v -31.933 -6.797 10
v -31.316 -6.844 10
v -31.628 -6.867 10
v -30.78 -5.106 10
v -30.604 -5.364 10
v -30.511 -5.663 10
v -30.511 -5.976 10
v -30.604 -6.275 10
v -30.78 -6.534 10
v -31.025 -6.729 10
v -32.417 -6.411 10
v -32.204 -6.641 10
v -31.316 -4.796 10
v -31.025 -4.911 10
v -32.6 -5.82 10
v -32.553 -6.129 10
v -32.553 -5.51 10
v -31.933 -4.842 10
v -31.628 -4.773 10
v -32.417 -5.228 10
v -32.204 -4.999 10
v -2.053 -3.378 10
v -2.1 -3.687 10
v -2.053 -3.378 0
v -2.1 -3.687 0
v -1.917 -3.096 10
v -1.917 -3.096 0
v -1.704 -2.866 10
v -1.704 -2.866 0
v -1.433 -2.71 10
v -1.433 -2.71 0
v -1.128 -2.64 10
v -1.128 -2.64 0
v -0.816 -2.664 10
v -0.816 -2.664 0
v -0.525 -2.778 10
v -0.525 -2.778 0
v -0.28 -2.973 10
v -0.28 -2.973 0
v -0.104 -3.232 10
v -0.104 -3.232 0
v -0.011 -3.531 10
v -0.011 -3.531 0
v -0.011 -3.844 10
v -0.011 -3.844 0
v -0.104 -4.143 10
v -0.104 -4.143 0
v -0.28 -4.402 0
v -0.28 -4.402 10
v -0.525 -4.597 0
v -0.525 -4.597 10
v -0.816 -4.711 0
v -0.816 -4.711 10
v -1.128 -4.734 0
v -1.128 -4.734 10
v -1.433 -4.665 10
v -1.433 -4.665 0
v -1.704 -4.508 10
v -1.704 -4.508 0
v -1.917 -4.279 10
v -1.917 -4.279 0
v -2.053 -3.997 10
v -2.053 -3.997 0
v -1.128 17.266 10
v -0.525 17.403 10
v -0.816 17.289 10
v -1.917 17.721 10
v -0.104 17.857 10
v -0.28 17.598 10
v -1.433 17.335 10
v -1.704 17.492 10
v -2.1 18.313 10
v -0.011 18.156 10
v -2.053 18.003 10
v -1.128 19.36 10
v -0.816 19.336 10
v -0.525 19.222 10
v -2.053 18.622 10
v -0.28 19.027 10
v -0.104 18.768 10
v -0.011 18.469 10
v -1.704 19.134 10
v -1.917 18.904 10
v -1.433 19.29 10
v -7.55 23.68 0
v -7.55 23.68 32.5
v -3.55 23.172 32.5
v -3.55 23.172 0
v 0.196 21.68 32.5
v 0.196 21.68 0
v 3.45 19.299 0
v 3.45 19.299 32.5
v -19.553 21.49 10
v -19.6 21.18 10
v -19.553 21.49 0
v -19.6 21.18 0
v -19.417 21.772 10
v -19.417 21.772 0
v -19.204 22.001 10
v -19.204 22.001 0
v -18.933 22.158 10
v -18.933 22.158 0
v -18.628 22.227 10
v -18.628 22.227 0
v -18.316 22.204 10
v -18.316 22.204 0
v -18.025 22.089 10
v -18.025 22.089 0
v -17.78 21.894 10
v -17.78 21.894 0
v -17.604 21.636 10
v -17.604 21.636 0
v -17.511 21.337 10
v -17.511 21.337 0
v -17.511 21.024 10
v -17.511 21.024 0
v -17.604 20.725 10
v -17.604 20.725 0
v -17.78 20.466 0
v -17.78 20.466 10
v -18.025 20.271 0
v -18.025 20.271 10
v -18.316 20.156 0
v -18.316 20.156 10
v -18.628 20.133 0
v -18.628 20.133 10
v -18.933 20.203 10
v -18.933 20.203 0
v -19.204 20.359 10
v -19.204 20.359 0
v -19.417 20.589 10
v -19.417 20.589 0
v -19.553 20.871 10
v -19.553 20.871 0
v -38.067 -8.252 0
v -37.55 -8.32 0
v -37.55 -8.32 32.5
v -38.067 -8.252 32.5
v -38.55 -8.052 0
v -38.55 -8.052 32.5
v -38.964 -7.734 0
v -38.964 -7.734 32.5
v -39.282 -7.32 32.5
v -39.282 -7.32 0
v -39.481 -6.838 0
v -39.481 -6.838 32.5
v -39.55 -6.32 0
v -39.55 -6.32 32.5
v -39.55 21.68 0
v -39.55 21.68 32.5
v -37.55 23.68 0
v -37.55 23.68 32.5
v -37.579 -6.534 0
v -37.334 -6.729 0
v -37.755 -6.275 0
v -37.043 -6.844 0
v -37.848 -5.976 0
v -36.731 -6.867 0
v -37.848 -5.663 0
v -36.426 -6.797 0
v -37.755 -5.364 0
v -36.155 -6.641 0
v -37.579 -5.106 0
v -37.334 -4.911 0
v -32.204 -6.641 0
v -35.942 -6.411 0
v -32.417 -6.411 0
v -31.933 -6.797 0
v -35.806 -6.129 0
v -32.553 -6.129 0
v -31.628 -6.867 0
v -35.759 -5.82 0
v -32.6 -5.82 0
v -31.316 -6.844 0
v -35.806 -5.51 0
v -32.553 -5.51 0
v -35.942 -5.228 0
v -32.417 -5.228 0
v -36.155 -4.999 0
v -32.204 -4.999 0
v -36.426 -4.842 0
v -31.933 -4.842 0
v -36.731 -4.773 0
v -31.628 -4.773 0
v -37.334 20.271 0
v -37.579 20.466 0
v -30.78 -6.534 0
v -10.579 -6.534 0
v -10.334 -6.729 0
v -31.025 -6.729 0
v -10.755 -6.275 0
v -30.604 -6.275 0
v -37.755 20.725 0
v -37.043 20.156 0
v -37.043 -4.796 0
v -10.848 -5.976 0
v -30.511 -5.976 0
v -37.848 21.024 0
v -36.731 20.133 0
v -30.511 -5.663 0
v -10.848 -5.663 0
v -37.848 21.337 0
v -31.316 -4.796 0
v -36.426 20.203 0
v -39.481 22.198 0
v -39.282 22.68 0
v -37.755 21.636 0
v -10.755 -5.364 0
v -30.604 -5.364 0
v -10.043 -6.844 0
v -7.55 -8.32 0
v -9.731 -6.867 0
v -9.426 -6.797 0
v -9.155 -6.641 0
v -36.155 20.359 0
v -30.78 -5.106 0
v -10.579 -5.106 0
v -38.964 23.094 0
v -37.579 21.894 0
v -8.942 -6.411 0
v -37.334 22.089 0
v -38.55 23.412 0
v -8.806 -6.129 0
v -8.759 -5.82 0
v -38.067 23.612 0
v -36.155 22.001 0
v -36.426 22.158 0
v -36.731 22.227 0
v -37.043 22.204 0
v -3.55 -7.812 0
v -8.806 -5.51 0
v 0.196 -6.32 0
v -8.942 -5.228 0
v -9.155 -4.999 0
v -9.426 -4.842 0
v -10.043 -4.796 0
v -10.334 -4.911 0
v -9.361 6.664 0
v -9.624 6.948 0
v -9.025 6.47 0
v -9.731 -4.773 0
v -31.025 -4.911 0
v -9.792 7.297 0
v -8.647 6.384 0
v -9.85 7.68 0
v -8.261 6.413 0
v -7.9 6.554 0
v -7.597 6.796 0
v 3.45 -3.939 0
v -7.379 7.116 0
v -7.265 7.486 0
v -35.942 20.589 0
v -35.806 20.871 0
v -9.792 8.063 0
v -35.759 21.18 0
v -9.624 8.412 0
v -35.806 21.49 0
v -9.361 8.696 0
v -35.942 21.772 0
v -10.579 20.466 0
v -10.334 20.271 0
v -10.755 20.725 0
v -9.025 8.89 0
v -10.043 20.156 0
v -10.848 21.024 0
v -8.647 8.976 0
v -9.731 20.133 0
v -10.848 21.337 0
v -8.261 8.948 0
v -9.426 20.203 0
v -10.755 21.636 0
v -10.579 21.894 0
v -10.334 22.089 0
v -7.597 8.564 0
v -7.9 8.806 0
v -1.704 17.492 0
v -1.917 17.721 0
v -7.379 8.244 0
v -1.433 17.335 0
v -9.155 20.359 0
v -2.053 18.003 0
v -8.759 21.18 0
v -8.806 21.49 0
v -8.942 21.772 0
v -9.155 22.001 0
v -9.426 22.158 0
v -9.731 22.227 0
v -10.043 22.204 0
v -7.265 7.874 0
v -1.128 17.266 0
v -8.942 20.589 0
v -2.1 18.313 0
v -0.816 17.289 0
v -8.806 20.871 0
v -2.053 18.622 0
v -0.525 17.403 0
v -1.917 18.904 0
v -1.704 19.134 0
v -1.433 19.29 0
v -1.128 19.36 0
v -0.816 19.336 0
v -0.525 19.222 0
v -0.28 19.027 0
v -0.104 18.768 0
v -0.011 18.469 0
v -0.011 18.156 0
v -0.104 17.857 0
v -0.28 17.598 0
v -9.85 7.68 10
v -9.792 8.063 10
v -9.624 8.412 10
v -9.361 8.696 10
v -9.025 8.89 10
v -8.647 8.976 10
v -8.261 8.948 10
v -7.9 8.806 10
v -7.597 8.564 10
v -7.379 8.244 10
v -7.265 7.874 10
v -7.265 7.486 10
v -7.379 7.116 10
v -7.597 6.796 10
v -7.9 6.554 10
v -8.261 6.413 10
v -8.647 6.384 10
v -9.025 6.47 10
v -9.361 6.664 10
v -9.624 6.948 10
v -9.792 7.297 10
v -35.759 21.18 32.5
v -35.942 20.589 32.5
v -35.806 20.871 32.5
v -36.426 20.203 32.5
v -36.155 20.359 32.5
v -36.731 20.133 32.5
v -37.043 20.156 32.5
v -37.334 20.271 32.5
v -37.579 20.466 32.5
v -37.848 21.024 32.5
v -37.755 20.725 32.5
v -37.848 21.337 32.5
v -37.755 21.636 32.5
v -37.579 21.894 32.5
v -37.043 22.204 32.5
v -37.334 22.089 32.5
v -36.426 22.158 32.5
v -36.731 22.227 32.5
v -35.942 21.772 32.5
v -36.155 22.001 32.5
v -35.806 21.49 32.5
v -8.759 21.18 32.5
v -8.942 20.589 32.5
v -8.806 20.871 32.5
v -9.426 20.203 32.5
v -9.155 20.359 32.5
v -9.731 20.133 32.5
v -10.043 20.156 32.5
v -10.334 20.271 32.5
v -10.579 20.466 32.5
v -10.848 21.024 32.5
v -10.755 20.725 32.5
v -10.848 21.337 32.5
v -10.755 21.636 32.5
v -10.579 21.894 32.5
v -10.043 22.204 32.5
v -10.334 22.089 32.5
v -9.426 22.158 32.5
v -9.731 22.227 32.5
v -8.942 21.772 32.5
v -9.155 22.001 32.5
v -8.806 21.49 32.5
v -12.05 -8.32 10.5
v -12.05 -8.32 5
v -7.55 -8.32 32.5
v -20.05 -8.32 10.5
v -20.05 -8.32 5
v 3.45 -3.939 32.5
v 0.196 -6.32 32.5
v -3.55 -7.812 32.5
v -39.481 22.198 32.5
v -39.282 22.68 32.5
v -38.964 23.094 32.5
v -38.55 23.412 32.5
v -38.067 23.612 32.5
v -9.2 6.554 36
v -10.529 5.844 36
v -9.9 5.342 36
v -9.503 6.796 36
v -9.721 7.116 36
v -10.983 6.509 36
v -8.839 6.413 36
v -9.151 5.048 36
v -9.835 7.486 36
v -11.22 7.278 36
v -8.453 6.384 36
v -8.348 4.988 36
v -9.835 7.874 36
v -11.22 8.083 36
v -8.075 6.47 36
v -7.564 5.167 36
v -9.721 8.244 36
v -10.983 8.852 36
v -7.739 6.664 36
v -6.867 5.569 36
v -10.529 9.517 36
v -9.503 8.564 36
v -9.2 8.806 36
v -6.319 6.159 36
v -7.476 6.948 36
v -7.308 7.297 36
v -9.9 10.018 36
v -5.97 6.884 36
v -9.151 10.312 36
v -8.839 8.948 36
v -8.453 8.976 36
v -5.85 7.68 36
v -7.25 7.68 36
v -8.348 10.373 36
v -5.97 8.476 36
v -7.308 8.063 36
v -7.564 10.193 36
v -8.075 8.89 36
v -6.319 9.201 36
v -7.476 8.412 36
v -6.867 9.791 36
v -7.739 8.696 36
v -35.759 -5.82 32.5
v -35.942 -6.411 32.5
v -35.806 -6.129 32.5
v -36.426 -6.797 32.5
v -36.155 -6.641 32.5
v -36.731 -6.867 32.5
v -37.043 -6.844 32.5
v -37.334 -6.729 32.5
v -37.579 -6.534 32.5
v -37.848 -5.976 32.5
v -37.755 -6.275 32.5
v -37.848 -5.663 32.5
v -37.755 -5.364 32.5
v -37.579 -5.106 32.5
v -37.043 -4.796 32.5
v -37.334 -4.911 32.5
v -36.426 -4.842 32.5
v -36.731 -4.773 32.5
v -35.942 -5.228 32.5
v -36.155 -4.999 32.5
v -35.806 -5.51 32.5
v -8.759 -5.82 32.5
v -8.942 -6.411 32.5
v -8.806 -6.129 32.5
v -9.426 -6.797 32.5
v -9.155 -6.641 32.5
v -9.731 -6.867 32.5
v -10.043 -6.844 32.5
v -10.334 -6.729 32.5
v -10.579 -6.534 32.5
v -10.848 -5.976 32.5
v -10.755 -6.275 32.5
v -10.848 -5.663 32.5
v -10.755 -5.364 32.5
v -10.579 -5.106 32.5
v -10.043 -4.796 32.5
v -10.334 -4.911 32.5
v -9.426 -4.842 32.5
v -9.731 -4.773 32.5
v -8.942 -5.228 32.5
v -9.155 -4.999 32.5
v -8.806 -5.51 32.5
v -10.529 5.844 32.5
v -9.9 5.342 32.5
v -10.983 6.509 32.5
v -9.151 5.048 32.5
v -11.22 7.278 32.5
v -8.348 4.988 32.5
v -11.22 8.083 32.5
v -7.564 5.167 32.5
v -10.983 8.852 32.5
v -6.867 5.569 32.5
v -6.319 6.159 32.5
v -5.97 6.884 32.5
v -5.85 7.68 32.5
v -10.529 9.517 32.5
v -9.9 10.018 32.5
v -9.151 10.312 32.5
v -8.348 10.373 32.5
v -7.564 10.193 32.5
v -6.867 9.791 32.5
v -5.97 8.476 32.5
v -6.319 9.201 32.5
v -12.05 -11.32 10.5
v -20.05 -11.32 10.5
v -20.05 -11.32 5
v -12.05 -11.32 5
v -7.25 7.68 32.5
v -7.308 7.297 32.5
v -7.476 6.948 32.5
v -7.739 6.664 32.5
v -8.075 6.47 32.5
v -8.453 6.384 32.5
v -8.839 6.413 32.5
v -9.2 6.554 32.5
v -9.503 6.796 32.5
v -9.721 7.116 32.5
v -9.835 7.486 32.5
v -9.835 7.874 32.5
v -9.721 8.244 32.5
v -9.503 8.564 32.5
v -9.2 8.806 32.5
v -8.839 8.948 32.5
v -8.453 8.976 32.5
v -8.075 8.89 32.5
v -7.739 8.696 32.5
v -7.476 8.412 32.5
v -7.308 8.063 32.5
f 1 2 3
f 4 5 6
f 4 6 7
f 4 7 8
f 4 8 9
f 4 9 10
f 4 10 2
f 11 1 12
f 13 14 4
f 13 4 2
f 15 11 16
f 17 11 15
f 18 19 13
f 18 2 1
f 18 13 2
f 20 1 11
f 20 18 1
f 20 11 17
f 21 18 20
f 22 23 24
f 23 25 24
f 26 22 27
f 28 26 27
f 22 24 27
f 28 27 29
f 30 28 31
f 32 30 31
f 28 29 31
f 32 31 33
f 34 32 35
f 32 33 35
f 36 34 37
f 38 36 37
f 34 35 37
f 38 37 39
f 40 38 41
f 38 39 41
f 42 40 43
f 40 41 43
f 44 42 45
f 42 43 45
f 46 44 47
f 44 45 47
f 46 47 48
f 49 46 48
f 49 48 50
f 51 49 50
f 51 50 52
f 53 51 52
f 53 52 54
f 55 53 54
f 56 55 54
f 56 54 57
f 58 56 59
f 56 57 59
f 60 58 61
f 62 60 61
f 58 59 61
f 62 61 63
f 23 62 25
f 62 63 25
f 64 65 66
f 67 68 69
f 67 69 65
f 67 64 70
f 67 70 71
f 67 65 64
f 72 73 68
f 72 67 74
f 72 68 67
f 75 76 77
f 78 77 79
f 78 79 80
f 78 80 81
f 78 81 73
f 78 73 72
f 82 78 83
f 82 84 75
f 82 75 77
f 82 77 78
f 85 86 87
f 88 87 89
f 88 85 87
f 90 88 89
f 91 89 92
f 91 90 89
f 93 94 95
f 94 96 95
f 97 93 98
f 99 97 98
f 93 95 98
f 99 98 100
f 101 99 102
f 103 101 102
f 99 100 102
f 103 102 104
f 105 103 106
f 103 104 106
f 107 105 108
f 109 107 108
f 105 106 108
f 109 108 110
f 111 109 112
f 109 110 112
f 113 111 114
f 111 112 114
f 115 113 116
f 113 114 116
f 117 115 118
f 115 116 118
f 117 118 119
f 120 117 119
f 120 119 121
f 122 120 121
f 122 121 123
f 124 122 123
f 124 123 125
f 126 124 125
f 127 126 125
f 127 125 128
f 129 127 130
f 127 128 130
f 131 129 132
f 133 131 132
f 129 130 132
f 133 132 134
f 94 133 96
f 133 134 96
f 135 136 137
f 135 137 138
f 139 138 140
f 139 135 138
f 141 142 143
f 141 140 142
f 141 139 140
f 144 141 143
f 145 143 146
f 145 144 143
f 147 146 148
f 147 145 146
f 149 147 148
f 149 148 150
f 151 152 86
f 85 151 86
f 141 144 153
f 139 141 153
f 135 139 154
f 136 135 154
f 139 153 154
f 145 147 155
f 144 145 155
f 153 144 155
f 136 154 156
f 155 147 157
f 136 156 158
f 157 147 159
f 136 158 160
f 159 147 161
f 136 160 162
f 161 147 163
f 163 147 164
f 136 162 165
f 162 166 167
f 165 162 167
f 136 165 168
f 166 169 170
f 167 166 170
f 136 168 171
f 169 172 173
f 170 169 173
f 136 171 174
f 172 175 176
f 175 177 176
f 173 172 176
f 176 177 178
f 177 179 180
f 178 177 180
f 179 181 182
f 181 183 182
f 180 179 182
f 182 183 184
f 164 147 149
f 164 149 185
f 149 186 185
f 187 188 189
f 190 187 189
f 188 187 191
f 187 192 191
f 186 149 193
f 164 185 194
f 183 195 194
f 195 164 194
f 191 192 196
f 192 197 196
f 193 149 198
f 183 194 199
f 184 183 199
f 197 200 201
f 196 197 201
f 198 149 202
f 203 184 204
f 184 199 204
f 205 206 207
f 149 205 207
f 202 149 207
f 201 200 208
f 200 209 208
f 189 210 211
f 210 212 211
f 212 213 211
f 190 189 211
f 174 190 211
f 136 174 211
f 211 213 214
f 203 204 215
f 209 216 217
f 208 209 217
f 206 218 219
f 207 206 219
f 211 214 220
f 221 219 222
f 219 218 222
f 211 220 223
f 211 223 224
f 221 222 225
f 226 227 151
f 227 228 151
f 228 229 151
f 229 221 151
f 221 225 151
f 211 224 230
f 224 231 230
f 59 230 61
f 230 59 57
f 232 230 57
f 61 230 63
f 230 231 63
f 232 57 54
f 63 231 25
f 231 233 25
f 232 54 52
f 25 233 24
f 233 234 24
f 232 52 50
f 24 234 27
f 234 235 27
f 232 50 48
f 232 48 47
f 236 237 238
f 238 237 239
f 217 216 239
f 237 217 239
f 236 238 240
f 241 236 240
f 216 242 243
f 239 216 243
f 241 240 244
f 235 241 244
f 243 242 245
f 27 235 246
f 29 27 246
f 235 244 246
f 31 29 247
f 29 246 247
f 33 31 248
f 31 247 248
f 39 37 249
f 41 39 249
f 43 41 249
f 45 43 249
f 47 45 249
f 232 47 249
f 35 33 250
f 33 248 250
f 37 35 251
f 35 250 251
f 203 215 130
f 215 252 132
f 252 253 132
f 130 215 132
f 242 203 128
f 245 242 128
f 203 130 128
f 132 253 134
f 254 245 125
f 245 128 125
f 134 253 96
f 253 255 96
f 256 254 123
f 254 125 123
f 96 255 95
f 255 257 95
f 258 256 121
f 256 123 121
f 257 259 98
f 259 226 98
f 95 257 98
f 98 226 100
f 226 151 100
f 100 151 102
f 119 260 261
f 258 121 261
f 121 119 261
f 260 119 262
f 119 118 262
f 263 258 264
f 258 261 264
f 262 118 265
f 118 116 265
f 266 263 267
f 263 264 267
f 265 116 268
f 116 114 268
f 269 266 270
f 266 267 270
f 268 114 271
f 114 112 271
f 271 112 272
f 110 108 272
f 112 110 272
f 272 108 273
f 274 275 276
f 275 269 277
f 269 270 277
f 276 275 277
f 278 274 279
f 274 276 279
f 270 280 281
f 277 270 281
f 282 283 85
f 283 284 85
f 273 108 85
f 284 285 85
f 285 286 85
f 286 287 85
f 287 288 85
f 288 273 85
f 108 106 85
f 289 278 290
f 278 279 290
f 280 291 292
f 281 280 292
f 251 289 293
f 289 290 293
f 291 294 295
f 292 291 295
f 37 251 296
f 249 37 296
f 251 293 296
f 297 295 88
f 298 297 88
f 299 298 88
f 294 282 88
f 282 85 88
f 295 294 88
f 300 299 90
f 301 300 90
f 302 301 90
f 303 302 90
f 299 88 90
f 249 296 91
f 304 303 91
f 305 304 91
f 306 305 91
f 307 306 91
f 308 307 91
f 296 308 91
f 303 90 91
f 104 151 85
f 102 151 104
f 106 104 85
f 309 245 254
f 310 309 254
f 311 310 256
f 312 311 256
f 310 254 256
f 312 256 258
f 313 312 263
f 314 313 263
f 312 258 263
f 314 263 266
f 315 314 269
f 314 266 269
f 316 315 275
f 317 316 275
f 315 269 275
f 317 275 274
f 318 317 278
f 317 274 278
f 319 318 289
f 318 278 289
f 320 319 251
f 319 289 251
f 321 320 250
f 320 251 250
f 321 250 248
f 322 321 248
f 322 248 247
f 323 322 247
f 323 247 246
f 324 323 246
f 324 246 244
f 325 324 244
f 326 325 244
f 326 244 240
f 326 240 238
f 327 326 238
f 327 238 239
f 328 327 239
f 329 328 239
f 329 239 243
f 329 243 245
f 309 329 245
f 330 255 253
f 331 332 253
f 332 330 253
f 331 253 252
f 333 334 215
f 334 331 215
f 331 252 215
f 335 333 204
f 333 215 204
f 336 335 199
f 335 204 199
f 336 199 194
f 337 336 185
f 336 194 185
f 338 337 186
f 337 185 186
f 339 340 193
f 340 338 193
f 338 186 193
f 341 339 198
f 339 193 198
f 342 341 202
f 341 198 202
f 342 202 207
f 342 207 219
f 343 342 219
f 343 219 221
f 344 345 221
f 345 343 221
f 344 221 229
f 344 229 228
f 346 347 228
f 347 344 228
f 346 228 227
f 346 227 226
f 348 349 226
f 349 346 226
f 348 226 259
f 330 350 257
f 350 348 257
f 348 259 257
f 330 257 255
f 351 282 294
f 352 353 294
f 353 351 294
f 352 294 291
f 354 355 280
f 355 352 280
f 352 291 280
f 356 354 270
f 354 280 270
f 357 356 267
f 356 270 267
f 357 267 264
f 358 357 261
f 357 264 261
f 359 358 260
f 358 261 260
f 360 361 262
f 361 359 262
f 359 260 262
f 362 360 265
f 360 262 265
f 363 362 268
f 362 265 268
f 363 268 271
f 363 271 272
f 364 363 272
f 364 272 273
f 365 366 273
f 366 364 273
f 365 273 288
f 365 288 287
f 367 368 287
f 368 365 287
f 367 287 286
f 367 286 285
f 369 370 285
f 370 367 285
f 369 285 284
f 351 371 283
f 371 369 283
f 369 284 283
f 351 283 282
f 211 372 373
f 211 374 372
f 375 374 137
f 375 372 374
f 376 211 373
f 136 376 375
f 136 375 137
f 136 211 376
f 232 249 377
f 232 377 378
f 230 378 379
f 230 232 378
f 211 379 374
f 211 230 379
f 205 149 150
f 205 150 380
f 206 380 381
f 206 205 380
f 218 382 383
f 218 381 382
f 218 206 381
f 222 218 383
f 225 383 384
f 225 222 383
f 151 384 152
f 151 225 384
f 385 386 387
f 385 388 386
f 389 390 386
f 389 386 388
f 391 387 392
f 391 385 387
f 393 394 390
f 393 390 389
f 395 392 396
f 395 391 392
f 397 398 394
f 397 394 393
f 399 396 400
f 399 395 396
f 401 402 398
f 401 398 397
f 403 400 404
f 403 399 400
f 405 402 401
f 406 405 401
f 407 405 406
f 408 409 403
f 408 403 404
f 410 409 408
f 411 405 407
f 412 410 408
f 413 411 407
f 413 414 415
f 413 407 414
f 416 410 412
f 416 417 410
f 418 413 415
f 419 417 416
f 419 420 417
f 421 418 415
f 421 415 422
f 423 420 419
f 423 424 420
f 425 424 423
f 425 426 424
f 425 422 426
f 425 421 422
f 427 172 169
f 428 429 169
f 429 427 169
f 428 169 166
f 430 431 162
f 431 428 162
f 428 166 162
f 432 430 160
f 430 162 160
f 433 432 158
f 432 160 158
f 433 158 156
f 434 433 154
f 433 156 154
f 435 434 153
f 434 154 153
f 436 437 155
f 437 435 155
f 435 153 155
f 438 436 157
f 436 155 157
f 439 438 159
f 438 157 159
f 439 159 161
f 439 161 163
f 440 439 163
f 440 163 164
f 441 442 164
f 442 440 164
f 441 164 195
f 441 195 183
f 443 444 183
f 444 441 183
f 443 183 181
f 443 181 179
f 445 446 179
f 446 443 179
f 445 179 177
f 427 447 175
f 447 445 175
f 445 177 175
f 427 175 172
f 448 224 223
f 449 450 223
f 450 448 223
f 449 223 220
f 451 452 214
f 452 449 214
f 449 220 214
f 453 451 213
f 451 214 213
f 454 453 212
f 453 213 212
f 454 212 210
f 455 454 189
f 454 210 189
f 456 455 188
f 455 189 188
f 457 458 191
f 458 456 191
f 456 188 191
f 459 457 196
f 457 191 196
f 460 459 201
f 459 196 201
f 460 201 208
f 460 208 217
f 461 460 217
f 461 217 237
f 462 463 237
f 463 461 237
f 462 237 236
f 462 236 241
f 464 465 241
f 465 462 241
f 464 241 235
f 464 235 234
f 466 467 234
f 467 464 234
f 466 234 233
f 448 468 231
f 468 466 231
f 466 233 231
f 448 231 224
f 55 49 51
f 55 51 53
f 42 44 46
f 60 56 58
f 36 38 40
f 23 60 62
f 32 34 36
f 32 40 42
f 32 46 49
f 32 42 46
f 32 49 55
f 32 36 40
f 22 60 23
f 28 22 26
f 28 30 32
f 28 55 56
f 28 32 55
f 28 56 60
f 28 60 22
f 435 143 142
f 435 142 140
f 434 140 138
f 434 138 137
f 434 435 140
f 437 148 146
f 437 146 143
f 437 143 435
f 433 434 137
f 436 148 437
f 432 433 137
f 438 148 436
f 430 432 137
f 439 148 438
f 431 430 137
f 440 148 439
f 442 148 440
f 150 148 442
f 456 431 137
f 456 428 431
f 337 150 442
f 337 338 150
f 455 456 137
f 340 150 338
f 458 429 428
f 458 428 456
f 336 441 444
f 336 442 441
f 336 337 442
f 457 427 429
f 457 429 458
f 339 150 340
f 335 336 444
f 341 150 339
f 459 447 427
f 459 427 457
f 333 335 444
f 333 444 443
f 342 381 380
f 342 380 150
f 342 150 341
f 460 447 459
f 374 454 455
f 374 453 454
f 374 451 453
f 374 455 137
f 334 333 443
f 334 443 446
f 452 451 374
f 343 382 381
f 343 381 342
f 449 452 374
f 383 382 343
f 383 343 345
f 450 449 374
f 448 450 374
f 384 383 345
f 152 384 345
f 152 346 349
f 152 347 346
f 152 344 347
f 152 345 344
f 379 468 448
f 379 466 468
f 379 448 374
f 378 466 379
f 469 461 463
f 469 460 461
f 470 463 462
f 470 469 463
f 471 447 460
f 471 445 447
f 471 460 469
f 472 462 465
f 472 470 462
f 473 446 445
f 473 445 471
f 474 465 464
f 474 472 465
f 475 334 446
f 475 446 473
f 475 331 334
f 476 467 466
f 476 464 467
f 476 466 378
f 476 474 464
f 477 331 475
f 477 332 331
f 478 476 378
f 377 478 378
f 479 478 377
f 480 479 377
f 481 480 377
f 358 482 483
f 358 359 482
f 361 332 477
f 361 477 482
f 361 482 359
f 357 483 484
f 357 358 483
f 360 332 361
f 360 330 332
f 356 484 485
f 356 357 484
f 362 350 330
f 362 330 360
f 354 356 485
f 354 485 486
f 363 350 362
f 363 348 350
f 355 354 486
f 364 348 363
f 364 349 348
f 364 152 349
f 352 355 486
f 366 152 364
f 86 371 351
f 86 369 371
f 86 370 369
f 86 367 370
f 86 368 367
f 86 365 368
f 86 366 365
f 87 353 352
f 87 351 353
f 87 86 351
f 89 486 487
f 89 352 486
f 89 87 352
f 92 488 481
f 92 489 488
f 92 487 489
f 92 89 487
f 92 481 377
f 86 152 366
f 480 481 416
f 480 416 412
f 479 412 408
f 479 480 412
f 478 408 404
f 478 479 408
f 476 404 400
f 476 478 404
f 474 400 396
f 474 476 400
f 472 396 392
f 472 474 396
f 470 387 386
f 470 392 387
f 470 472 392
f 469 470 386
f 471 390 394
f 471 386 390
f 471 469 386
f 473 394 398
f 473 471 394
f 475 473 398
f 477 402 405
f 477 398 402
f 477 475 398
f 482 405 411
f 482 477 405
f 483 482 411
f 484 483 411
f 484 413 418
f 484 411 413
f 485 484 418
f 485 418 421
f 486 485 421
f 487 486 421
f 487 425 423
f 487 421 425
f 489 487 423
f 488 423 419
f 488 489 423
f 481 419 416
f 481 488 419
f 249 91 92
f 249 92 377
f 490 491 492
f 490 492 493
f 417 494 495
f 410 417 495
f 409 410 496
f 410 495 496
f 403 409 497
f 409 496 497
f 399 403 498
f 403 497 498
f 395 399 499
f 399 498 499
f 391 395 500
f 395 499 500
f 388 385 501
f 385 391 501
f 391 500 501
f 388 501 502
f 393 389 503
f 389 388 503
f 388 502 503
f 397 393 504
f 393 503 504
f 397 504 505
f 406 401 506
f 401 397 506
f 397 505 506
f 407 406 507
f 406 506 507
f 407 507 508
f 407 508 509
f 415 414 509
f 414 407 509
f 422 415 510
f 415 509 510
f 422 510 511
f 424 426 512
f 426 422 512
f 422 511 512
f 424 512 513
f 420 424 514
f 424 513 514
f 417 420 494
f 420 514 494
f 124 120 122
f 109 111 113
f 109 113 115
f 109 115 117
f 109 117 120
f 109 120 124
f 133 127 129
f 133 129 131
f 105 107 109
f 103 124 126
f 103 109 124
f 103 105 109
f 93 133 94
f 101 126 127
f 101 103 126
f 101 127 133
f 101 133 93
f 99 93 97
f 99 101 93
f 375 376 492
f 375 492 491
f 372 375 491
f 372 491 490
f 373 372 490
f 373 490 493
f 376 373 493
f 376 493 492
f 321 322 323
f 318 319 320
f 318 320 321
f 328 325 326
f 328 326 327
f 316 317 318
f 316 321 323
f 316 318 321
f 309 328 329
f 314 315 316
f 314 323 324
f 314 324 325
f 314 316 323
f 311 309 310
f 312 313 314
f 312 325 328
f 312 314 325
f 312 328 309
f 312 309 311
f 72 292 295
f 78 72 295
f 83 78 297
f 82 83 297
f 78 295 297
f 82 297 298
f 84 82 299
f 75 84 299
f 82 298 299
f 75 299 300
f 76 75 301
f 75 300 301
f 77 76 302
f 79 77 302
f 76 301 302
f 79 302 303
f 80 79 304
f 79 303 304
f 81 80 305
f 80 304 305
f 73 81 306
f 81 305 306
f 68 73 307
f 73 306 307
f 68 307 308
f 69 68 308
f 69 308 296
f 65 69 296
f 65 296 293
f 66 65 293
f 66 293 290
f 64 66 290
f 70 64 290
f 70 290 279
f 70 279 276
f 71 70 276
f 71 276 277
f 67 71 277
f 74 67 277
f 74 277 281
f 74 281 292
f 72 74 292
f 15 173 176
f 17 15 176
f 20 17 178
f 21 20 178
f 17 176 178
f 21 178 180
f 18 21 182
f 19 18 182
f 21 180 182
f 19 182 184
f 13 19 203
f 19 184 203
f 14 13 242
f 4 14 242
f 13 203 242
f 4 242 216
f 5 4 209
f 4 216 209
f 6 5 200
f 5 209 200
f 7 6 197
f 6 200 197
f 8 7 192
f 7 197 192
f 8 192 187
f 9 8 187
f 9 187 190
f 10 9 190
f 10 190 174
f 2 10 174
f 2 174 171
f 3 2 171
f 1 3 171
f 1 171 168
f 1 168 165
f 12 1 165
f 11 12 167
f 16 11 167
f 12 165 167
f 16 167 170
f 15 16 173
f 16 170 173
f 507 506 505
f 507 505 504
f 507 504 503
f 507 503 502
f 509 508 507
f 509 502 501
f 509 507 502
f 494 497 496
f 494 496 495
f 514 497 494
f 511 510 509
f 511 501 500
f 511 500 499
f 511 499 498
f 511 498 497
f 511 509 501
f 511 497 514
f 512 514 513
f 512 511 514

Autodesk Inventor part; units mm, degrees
ref_plane "YZ Plane" through (0, 0, 0) normal (1, 0, 0) x (0, 1, 0)
ref_plane "XZ Plane" through (0, 0, 0) normal (0, 1, 0) x (-1, 0, 0)
ref_plane "XY Plane" through (0, 0, 0) normal (0, 0, 1) x (1, 0, 0)
sketch "スケッチ1" plane through (0, 0, 0) normal (0, 0, 1) x (1, 0, 0)
  line L0 (-37.5496, 23.6801) -> (-7.5496, 23.6801)
  line L1 (3.4504, 19.2991) -> (3.4504, -3.9388)
  line L2 (-7.5496, -8.3199) -> (-37.5496, -8.3199)
  line L3 (-39.5496, -6.3199) -> (-39.5496, 21.6801)
  circle A0 centre (-36.8093, -5.8199) radius 1.05
  circle A1 centre (-36.8093, 21.1801) radius 1.05
  arc A2 (-37.5496, 23.6801) -> (-39.5496, 21.6801) centre (-37.5496, 21.6801) ccw
  arc A3 (-39.5496, -6.3199) -> (-37.5496, -8.3199) centre (-37.5496, -6.3199) ccw
  circle A4 centre (-9.8093, -5.8199) radius 1.05
  circle A5 centre (-9.8093, 21.1801) radius 1.05
  line L4 (-39.5496, 7.6801) -> (3.4504, 7.6801) construction
  line L5 (-17.0496, 23.6801) -> (-17.0496, -8.3199) construction
  arc A6 (-7.5496, -8.3199) -> (3.4504, -3.9388) centre (-7.5496, 7.6801) ccw
  arc A7 (3.4504, 19.2991) -> (-7.5496, 23.6801) centre (-7.5496, 7.6801) ccw
  point P0 (-39.5496, -8.3199)
  point P1 (-17.0496, 7.6801)
  dimension "d23" = 2.1
  dimension "d24" = 2.1
  dimension "d25" = 27
  dimension "d26" = 2.5
  dimension "d27" = 2.5
  dimension "d28" = 2
  dimension "d31" = 2.1
  dimension "d32" = 2.1
  dimension "d33" = 27
  dimension "d34" = 27
extrude "押し出し1" add sketch "スケッチ1" along normal blind 32.5
sketch "スケッチ2" plane through (0, 0, 32.5) normal (0, 0, 1) x (1, 0, 0)
  circle A0 centre (-9.8093, 21.1801) radius 1.05 projected
  circle A1 centre (-9.8093, -5.8199) radius 1.05 projected
  circle A2 centre (-36.8093, 21.1801) radius 1.05 projected
  circle A3 centre (-36.8093, -5.8199) radius 1.05 projected
  line L0 (3.4504, -3.9388) -> (3.4504, 19.2991) projected
  arc A4 (3.4504, 19.2991) -> (-7.5496, 23.6801) centre (-7.5496, 7.6801) ccw projected
  line L1 (-7.5496, 23.6801) -> (-37.5496, 23.6801) projected
  arc A5 (-37.5496, 23.6801) -> (-39.5496, 21.6801) centre (-37.5496, 21.6801) ccw projected
  line L2 (-39.5496, 21.6801) -> (-39.5496, -6.3199) projected
  arc A6 (-39.5496, -6.3199) -> (-37.5496, -8.3199) centre (-37.5496, -6.3199) ccw projected
  line L3 (-37.5496, -8.3199) -> (-7.5496, -8.3199) projected
  arc A7 (-7.5496, -8.3199) -> (3.4504, -3.9388) centre (-7.5496, 7.6801) ccw projected
  line L4 (-39.5496, 21.6801) -> (-39.5496, -6.3199) construction
  line L5 (-39.5496, 7.6801) -> (3.4504, 7.6801) construction
  line L6 (-7.5496, -8.3199) -> (-37.5496, -8.3199) construction
  line L7 (-18.0496, -8.3199) -> (-18.0496, 23.6801) construction
  line L8 (-7.5496, 23.6801) -> (-37.5496, 23.6801) construction
  circle A8 centre (-8.55, 7.6801) radius 2.7
  circle A9 centre (-8.55, 7.6801) radius 1.3
  point P0 (0, 0)
  dimension "d49" = 5.4
  dimension "d50" = 2.6
  dimension "d51" = 9.4996
extrude "押し出し3" add sketch "スケッチ2" along normal blind 3.5 contours A8
sketch "スケッチ3" plane through (0, 0, 0) normal (0, 0, -1) x (-1, 0, 0)
  circle A0 centre (9.8093, 21.1801) radius 1.05 projected
  circle A1 centre (9.8093, -5.8199) radius 1.05 projected
  circle A2 centre (36.8093, 21.1801) radius 1.05 projected
  circle A3 centre (36.8093, -5.8199) radius 1.05 projected
  line L0 (-3.4504, 19.2991) -> (-3.4504, -3.9388) projected
  arc A4 (-3.4504, -3.9388) -> (7.5496, -8.3199) centre (7.5496, 7.6801) ccw projected
  line L1 (7.5496, -8.3199) -> (37.5496, -8.3199) projected
  arc A5 (37.5496, -8.3199) -> (39.5496, -6.3199) centre (37.5496, -6.3199) ccw projected
  line L2 (39.5496, -6.3199) -> (39.5496, 21.6801) projected
  arc A6 (39.5496, 21.6801) -> (37.5496, 23.6801) centre (37.5496, 21.6801) ccw projected
  line L3 (37.5496, 23.6801) -> (7.5496, 23.6801) projected
  arc A7 (7.5496, 23.6801) -> (-3.4504, 19.2991) centre (7.5496, 7.6801) ccw projected
  line L4 (39.5496, -6.3199) -> (39.5496, 21.6801) construction
  line L5 (39.5496, 7.6801) -> (-3.4504, 7.6801) construction
  line L6 (-3.4504, 19.2991) -> (-3.4504, -3.9388) construction
  line L7 (7.5496, -8.3199) -> (37.5496, -8.3199) construction
  line L8 (18.0496, -8.3199) -> (18.0496, 23.6801) construction
  line L9 (37.5496, 23.6801) -> (7.5496, 23.6801) construction
  circle A8 centre (8.55, 7.6801) radius 1.3
  circle A9 centre (31.5496, -5.8199) radius 1.05
  circle A10 centre (18.5496, 21.1801) radius 1.05
  circle A11 centre (1.0496, 18.3126) radius 1.05
  circle A12 centre (1.0496, -3.6874) radius 1.05
  point P0 (0, 0)
  dimension "d54" = 2.6
  dimension "d55" = 2.1
  dimension "d56" = 13.5
  dimension "d57" = 2.1
  dimension "d58" = 0.5
  dimension "d59" = 2.1
  dimension "d60" = 17
  dimension "d61" = 2.1
  dimension "d62" = 22
  dimension "d63" = 17
extrude "押し出し4" cut sketch "スケッチ3" against normal blind 10 contours A8 | A9 | A10 | A11 | A12
sketch "スケッチ4" plane through (-37.5496, -8.3199, 0) normal (0, -1, 0) x (1, 0, 0)
  line L0 (30, 0) -> (0, 0) projected
  line L1 (30, 0) -> (30, 32.5) projected
  line L2 (0, 32.5) -> (30, 32.5) projected
  line L3 (0, 0) -> (0, 32.5) projected
  line L4 (0, 0) -> (-2, 0) projected
  line L5 (0, 0) -> (0, 32.5) projected
  line L6 (-2, 32.5) -> (0, 32.5) projected
  line L7 (-2, 0) -> (-2, 32.5) projected
  line L8 (41, 0) -> (30, 0) projected
  line L9 (41, 0) -> (41, 32.5) projected
  line L10 (30, 32.5) -> (41, 32.5) projected
  line L11 (30, 0) -> (30, 32.5) projected
  line L12 (0, 32.5) -> (30, 32.5) construction
  line L13 (19.5, 32.5) -> (19.5, 0) construction
  line L14 (17.5, 10.5) -> (25.5, 10.5)
  line L15 (25.5, 10.5) -> (25.5, 5)
  line L16 (25.5, 5) -> (17.5, 5)
  line L17 (17.5, 5) -> (17.5, 10.5)
  point P0 (37.5496, 0)
  dimension "d66" = 21.5
  dimension "d67" = 8
  dimension "d68" = 5.5
  dimension "d69" = 5
  dimension "d70" = 2
extrude "押し出し5" add sketch "スケッチ4" along normal blind 3 contours L14 L15 L16 L17
properties part number "KRS-4034HV" material "アセタール樹脂、黒"
